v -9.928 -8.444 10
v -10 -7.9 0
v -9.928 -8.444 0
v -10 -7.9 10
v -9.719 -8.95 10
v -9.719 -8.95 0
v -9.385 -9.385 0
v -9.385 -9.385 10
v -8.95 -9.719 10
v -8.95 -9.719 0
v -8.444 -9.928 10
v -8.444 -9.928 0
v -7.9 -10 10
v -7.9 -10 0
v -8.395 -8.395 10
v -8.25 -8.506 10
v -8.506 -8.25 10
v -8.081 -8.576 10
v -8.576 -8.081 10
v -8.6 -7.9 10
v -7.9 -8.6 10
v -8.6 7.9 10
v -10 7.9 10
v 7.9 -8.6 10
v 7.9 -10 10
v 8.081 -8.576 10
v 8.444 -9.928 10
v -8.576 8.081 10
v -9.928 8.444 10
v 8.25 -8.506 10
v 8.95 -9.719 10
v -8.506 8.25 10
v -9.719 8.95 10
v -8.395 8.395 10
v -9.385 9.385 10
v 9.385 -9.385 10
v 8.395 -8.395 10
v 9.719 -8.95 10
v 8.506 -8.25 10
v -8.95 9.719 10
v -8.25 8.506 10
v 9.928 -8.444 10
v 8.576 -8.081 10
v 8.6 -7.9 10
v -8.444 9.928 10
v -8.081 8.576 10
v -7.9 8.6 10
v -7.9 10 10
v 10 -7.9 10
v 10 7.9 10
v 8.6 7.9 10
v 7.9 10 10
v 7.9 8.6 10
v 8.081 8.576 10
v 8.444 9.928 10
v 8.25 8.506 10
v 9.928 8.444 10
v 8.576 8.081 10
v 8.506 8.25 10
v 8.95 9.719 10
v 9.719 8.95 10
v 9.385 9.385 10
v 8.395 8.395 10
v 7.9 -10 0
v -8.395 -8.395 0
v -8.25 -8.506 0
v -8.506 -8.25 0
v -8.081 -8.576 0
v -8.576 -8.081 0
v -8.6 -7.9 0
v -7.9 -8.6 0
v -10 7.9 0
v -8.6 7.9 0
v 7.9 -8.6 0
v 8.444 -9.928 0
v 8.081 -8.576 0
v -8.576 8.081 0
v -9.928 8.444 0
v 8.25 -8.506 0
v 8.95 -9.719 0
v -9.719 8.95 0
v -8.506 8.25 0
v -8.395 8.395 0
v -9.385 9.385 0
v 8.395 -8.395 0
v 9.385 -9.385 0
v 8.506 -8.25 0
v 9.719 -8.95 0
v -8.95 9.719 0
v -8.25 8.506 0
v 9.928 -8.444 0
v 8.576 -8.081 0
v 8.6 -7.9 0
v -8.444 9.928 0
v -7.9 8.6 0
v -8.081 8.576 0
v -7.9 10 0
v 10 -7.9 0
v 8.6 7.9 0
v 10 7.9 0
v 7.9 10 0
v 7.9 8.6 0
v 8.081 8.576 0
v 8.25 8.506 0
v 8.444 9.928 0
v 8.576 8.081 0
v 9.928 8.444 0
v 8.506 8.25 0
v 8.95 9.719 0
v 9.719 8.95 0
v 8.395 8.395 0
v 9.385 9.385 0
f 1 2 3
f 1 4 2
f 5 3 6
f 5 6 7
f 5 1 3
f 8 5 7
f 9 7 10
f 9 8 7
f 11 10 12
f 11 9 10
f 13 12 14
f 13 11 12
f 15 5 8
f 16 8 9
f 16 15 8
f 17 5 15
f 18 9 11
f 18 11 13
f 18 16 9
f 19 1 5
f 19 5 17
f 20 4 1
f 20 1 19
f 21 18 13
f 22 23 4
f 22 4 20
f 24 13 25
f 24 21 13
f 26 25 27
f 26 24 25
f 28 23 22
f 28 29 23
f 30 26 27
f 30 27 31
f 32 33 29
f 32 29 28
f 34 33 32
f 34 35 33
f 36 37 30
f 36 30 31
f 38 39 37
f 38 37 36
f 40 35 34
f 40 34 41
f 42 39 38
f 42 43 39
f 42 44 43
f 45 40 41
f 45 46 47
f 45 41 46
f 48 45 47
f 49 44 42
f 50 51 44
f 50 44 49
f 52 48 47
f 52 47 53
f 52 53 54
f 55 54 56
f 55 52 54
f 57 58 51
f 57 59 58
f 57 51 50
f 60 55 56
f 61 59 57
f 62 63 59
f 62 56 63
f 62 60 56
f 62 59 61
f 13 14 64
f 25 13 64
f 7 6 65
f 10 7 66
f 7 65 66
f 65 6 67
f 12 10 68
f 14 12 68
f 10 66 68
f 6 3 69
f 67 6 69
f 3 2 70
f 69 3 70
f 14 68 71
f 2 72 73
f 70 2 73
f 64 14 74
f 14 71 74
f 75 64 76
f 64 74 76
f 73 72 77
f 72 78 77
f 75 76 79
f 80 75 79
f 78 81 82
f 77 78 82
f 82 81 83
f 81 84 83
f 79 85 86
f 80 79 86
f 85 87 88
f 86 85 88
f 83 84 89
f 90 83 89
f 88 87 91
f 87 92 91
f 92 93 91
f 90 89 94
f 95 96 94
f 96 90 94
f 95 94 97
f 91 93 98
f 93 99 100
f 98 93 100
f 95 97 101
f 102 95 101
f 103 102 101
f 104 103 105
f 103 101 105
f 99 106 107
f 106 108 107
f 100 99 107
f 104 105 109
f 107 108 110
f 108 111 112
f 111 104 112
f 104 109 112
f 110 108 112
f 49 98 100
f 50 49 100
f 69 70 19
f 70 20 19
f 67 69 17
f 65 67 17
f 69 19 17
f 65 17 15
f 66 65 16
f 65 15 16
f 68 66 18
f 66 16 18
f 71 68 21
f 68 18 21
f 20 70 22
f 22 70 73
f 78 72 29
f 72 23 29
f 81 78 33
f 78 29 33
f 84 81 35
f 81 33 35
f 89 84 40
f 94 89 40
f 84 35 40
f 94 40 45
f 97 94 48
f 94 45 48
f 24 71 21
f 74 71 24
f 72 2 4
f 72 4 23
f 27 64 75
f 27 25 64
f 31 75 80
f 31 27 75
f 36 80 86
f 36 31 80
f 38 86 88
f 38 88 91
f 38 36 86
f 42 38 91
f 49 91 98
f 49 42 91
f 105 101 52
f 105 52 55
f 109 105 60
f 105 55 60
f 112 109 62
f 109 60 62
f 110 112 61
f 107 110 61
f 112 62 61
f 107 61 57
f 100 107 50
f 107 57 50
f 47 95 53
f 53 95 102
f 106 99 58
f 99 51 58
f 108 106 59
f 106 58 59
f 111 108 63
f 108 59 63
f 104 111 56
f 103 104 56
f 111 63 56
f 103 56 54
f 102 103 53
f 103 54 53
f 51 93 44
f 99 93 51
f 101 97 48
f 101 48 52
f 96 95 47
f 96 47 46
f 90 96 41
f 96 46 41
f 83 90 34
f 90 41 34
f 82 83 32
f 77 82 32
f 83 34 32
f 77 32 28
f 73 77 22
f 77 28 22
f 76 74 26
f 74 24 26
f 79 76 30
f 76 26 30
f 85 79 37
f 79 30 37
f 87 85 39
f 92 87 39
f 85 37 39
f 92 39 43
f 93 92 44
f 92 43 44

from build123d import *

# Parameters (mm, degrees)
F0_W     = 20
F0_H     = 20
F0_W_2   = 17.2
F0_H_2   = 17.2
F1_DEPTH = 10
F2_R     = 2.1
F3_R     = 2.1
F4_R     = 0.7
F5_R     = 0.7
F6_R     = 0.7
F7_R     = 0.7


with BuildPart() as f1:
    # F0 (on Top) → F1 (new body)
    with BuildSketch(Plane.XY):
        Rectangle(F0_W, F0_H)
        Rectangle(F0_W_2, F0_H_2, mode=Mode.SUBTRACT)
    extrude(amount=F1_DEPTH)

    # F2
    f2_edges = [f1.edges().sort_by_distance(p)[0] for p in [
        (-10, -10, 5),
        (10, -10, 5),
        (10, 10, 5),
    ]]
    fillet(f2_edges, radius=F2_R)

    # F3
    f3_edges = [f1.edges().sort_by_distance(p)[0] for p in [
        (-10, 10, 5),
    ]]
    fillet(f3_edges, radius=F3_R)

    # F4
    f4_edges = [f1.edges().sort_by_distance(p)[0] for p in [
        (-8.6, 8.6, 5),
    ]]
    fillet(f4_edges, radius=F4_R)

    # F5
    f5_edges = [f1.edges().sort_by_distance(p)[0] for p in [
        (-8.6, -8.6, 5),
    ]]
    fillet(f5_edges, radius=F5_R)

    # F6
    f6_edges = [f1.edges().sort_by_distance(p)[0] for p in [
        (8.6, -8.6, 5),
    ]]
    fillet(f6_edges, radius=F6_R)

    # F7
    f7_edges = [f1.edges().sort_by_distance(p)[0] for p in [
        (8.6, 8.6, 5),
    ]]
    fillet(f7_edges, radius=F7_R)


solid = f1.part
